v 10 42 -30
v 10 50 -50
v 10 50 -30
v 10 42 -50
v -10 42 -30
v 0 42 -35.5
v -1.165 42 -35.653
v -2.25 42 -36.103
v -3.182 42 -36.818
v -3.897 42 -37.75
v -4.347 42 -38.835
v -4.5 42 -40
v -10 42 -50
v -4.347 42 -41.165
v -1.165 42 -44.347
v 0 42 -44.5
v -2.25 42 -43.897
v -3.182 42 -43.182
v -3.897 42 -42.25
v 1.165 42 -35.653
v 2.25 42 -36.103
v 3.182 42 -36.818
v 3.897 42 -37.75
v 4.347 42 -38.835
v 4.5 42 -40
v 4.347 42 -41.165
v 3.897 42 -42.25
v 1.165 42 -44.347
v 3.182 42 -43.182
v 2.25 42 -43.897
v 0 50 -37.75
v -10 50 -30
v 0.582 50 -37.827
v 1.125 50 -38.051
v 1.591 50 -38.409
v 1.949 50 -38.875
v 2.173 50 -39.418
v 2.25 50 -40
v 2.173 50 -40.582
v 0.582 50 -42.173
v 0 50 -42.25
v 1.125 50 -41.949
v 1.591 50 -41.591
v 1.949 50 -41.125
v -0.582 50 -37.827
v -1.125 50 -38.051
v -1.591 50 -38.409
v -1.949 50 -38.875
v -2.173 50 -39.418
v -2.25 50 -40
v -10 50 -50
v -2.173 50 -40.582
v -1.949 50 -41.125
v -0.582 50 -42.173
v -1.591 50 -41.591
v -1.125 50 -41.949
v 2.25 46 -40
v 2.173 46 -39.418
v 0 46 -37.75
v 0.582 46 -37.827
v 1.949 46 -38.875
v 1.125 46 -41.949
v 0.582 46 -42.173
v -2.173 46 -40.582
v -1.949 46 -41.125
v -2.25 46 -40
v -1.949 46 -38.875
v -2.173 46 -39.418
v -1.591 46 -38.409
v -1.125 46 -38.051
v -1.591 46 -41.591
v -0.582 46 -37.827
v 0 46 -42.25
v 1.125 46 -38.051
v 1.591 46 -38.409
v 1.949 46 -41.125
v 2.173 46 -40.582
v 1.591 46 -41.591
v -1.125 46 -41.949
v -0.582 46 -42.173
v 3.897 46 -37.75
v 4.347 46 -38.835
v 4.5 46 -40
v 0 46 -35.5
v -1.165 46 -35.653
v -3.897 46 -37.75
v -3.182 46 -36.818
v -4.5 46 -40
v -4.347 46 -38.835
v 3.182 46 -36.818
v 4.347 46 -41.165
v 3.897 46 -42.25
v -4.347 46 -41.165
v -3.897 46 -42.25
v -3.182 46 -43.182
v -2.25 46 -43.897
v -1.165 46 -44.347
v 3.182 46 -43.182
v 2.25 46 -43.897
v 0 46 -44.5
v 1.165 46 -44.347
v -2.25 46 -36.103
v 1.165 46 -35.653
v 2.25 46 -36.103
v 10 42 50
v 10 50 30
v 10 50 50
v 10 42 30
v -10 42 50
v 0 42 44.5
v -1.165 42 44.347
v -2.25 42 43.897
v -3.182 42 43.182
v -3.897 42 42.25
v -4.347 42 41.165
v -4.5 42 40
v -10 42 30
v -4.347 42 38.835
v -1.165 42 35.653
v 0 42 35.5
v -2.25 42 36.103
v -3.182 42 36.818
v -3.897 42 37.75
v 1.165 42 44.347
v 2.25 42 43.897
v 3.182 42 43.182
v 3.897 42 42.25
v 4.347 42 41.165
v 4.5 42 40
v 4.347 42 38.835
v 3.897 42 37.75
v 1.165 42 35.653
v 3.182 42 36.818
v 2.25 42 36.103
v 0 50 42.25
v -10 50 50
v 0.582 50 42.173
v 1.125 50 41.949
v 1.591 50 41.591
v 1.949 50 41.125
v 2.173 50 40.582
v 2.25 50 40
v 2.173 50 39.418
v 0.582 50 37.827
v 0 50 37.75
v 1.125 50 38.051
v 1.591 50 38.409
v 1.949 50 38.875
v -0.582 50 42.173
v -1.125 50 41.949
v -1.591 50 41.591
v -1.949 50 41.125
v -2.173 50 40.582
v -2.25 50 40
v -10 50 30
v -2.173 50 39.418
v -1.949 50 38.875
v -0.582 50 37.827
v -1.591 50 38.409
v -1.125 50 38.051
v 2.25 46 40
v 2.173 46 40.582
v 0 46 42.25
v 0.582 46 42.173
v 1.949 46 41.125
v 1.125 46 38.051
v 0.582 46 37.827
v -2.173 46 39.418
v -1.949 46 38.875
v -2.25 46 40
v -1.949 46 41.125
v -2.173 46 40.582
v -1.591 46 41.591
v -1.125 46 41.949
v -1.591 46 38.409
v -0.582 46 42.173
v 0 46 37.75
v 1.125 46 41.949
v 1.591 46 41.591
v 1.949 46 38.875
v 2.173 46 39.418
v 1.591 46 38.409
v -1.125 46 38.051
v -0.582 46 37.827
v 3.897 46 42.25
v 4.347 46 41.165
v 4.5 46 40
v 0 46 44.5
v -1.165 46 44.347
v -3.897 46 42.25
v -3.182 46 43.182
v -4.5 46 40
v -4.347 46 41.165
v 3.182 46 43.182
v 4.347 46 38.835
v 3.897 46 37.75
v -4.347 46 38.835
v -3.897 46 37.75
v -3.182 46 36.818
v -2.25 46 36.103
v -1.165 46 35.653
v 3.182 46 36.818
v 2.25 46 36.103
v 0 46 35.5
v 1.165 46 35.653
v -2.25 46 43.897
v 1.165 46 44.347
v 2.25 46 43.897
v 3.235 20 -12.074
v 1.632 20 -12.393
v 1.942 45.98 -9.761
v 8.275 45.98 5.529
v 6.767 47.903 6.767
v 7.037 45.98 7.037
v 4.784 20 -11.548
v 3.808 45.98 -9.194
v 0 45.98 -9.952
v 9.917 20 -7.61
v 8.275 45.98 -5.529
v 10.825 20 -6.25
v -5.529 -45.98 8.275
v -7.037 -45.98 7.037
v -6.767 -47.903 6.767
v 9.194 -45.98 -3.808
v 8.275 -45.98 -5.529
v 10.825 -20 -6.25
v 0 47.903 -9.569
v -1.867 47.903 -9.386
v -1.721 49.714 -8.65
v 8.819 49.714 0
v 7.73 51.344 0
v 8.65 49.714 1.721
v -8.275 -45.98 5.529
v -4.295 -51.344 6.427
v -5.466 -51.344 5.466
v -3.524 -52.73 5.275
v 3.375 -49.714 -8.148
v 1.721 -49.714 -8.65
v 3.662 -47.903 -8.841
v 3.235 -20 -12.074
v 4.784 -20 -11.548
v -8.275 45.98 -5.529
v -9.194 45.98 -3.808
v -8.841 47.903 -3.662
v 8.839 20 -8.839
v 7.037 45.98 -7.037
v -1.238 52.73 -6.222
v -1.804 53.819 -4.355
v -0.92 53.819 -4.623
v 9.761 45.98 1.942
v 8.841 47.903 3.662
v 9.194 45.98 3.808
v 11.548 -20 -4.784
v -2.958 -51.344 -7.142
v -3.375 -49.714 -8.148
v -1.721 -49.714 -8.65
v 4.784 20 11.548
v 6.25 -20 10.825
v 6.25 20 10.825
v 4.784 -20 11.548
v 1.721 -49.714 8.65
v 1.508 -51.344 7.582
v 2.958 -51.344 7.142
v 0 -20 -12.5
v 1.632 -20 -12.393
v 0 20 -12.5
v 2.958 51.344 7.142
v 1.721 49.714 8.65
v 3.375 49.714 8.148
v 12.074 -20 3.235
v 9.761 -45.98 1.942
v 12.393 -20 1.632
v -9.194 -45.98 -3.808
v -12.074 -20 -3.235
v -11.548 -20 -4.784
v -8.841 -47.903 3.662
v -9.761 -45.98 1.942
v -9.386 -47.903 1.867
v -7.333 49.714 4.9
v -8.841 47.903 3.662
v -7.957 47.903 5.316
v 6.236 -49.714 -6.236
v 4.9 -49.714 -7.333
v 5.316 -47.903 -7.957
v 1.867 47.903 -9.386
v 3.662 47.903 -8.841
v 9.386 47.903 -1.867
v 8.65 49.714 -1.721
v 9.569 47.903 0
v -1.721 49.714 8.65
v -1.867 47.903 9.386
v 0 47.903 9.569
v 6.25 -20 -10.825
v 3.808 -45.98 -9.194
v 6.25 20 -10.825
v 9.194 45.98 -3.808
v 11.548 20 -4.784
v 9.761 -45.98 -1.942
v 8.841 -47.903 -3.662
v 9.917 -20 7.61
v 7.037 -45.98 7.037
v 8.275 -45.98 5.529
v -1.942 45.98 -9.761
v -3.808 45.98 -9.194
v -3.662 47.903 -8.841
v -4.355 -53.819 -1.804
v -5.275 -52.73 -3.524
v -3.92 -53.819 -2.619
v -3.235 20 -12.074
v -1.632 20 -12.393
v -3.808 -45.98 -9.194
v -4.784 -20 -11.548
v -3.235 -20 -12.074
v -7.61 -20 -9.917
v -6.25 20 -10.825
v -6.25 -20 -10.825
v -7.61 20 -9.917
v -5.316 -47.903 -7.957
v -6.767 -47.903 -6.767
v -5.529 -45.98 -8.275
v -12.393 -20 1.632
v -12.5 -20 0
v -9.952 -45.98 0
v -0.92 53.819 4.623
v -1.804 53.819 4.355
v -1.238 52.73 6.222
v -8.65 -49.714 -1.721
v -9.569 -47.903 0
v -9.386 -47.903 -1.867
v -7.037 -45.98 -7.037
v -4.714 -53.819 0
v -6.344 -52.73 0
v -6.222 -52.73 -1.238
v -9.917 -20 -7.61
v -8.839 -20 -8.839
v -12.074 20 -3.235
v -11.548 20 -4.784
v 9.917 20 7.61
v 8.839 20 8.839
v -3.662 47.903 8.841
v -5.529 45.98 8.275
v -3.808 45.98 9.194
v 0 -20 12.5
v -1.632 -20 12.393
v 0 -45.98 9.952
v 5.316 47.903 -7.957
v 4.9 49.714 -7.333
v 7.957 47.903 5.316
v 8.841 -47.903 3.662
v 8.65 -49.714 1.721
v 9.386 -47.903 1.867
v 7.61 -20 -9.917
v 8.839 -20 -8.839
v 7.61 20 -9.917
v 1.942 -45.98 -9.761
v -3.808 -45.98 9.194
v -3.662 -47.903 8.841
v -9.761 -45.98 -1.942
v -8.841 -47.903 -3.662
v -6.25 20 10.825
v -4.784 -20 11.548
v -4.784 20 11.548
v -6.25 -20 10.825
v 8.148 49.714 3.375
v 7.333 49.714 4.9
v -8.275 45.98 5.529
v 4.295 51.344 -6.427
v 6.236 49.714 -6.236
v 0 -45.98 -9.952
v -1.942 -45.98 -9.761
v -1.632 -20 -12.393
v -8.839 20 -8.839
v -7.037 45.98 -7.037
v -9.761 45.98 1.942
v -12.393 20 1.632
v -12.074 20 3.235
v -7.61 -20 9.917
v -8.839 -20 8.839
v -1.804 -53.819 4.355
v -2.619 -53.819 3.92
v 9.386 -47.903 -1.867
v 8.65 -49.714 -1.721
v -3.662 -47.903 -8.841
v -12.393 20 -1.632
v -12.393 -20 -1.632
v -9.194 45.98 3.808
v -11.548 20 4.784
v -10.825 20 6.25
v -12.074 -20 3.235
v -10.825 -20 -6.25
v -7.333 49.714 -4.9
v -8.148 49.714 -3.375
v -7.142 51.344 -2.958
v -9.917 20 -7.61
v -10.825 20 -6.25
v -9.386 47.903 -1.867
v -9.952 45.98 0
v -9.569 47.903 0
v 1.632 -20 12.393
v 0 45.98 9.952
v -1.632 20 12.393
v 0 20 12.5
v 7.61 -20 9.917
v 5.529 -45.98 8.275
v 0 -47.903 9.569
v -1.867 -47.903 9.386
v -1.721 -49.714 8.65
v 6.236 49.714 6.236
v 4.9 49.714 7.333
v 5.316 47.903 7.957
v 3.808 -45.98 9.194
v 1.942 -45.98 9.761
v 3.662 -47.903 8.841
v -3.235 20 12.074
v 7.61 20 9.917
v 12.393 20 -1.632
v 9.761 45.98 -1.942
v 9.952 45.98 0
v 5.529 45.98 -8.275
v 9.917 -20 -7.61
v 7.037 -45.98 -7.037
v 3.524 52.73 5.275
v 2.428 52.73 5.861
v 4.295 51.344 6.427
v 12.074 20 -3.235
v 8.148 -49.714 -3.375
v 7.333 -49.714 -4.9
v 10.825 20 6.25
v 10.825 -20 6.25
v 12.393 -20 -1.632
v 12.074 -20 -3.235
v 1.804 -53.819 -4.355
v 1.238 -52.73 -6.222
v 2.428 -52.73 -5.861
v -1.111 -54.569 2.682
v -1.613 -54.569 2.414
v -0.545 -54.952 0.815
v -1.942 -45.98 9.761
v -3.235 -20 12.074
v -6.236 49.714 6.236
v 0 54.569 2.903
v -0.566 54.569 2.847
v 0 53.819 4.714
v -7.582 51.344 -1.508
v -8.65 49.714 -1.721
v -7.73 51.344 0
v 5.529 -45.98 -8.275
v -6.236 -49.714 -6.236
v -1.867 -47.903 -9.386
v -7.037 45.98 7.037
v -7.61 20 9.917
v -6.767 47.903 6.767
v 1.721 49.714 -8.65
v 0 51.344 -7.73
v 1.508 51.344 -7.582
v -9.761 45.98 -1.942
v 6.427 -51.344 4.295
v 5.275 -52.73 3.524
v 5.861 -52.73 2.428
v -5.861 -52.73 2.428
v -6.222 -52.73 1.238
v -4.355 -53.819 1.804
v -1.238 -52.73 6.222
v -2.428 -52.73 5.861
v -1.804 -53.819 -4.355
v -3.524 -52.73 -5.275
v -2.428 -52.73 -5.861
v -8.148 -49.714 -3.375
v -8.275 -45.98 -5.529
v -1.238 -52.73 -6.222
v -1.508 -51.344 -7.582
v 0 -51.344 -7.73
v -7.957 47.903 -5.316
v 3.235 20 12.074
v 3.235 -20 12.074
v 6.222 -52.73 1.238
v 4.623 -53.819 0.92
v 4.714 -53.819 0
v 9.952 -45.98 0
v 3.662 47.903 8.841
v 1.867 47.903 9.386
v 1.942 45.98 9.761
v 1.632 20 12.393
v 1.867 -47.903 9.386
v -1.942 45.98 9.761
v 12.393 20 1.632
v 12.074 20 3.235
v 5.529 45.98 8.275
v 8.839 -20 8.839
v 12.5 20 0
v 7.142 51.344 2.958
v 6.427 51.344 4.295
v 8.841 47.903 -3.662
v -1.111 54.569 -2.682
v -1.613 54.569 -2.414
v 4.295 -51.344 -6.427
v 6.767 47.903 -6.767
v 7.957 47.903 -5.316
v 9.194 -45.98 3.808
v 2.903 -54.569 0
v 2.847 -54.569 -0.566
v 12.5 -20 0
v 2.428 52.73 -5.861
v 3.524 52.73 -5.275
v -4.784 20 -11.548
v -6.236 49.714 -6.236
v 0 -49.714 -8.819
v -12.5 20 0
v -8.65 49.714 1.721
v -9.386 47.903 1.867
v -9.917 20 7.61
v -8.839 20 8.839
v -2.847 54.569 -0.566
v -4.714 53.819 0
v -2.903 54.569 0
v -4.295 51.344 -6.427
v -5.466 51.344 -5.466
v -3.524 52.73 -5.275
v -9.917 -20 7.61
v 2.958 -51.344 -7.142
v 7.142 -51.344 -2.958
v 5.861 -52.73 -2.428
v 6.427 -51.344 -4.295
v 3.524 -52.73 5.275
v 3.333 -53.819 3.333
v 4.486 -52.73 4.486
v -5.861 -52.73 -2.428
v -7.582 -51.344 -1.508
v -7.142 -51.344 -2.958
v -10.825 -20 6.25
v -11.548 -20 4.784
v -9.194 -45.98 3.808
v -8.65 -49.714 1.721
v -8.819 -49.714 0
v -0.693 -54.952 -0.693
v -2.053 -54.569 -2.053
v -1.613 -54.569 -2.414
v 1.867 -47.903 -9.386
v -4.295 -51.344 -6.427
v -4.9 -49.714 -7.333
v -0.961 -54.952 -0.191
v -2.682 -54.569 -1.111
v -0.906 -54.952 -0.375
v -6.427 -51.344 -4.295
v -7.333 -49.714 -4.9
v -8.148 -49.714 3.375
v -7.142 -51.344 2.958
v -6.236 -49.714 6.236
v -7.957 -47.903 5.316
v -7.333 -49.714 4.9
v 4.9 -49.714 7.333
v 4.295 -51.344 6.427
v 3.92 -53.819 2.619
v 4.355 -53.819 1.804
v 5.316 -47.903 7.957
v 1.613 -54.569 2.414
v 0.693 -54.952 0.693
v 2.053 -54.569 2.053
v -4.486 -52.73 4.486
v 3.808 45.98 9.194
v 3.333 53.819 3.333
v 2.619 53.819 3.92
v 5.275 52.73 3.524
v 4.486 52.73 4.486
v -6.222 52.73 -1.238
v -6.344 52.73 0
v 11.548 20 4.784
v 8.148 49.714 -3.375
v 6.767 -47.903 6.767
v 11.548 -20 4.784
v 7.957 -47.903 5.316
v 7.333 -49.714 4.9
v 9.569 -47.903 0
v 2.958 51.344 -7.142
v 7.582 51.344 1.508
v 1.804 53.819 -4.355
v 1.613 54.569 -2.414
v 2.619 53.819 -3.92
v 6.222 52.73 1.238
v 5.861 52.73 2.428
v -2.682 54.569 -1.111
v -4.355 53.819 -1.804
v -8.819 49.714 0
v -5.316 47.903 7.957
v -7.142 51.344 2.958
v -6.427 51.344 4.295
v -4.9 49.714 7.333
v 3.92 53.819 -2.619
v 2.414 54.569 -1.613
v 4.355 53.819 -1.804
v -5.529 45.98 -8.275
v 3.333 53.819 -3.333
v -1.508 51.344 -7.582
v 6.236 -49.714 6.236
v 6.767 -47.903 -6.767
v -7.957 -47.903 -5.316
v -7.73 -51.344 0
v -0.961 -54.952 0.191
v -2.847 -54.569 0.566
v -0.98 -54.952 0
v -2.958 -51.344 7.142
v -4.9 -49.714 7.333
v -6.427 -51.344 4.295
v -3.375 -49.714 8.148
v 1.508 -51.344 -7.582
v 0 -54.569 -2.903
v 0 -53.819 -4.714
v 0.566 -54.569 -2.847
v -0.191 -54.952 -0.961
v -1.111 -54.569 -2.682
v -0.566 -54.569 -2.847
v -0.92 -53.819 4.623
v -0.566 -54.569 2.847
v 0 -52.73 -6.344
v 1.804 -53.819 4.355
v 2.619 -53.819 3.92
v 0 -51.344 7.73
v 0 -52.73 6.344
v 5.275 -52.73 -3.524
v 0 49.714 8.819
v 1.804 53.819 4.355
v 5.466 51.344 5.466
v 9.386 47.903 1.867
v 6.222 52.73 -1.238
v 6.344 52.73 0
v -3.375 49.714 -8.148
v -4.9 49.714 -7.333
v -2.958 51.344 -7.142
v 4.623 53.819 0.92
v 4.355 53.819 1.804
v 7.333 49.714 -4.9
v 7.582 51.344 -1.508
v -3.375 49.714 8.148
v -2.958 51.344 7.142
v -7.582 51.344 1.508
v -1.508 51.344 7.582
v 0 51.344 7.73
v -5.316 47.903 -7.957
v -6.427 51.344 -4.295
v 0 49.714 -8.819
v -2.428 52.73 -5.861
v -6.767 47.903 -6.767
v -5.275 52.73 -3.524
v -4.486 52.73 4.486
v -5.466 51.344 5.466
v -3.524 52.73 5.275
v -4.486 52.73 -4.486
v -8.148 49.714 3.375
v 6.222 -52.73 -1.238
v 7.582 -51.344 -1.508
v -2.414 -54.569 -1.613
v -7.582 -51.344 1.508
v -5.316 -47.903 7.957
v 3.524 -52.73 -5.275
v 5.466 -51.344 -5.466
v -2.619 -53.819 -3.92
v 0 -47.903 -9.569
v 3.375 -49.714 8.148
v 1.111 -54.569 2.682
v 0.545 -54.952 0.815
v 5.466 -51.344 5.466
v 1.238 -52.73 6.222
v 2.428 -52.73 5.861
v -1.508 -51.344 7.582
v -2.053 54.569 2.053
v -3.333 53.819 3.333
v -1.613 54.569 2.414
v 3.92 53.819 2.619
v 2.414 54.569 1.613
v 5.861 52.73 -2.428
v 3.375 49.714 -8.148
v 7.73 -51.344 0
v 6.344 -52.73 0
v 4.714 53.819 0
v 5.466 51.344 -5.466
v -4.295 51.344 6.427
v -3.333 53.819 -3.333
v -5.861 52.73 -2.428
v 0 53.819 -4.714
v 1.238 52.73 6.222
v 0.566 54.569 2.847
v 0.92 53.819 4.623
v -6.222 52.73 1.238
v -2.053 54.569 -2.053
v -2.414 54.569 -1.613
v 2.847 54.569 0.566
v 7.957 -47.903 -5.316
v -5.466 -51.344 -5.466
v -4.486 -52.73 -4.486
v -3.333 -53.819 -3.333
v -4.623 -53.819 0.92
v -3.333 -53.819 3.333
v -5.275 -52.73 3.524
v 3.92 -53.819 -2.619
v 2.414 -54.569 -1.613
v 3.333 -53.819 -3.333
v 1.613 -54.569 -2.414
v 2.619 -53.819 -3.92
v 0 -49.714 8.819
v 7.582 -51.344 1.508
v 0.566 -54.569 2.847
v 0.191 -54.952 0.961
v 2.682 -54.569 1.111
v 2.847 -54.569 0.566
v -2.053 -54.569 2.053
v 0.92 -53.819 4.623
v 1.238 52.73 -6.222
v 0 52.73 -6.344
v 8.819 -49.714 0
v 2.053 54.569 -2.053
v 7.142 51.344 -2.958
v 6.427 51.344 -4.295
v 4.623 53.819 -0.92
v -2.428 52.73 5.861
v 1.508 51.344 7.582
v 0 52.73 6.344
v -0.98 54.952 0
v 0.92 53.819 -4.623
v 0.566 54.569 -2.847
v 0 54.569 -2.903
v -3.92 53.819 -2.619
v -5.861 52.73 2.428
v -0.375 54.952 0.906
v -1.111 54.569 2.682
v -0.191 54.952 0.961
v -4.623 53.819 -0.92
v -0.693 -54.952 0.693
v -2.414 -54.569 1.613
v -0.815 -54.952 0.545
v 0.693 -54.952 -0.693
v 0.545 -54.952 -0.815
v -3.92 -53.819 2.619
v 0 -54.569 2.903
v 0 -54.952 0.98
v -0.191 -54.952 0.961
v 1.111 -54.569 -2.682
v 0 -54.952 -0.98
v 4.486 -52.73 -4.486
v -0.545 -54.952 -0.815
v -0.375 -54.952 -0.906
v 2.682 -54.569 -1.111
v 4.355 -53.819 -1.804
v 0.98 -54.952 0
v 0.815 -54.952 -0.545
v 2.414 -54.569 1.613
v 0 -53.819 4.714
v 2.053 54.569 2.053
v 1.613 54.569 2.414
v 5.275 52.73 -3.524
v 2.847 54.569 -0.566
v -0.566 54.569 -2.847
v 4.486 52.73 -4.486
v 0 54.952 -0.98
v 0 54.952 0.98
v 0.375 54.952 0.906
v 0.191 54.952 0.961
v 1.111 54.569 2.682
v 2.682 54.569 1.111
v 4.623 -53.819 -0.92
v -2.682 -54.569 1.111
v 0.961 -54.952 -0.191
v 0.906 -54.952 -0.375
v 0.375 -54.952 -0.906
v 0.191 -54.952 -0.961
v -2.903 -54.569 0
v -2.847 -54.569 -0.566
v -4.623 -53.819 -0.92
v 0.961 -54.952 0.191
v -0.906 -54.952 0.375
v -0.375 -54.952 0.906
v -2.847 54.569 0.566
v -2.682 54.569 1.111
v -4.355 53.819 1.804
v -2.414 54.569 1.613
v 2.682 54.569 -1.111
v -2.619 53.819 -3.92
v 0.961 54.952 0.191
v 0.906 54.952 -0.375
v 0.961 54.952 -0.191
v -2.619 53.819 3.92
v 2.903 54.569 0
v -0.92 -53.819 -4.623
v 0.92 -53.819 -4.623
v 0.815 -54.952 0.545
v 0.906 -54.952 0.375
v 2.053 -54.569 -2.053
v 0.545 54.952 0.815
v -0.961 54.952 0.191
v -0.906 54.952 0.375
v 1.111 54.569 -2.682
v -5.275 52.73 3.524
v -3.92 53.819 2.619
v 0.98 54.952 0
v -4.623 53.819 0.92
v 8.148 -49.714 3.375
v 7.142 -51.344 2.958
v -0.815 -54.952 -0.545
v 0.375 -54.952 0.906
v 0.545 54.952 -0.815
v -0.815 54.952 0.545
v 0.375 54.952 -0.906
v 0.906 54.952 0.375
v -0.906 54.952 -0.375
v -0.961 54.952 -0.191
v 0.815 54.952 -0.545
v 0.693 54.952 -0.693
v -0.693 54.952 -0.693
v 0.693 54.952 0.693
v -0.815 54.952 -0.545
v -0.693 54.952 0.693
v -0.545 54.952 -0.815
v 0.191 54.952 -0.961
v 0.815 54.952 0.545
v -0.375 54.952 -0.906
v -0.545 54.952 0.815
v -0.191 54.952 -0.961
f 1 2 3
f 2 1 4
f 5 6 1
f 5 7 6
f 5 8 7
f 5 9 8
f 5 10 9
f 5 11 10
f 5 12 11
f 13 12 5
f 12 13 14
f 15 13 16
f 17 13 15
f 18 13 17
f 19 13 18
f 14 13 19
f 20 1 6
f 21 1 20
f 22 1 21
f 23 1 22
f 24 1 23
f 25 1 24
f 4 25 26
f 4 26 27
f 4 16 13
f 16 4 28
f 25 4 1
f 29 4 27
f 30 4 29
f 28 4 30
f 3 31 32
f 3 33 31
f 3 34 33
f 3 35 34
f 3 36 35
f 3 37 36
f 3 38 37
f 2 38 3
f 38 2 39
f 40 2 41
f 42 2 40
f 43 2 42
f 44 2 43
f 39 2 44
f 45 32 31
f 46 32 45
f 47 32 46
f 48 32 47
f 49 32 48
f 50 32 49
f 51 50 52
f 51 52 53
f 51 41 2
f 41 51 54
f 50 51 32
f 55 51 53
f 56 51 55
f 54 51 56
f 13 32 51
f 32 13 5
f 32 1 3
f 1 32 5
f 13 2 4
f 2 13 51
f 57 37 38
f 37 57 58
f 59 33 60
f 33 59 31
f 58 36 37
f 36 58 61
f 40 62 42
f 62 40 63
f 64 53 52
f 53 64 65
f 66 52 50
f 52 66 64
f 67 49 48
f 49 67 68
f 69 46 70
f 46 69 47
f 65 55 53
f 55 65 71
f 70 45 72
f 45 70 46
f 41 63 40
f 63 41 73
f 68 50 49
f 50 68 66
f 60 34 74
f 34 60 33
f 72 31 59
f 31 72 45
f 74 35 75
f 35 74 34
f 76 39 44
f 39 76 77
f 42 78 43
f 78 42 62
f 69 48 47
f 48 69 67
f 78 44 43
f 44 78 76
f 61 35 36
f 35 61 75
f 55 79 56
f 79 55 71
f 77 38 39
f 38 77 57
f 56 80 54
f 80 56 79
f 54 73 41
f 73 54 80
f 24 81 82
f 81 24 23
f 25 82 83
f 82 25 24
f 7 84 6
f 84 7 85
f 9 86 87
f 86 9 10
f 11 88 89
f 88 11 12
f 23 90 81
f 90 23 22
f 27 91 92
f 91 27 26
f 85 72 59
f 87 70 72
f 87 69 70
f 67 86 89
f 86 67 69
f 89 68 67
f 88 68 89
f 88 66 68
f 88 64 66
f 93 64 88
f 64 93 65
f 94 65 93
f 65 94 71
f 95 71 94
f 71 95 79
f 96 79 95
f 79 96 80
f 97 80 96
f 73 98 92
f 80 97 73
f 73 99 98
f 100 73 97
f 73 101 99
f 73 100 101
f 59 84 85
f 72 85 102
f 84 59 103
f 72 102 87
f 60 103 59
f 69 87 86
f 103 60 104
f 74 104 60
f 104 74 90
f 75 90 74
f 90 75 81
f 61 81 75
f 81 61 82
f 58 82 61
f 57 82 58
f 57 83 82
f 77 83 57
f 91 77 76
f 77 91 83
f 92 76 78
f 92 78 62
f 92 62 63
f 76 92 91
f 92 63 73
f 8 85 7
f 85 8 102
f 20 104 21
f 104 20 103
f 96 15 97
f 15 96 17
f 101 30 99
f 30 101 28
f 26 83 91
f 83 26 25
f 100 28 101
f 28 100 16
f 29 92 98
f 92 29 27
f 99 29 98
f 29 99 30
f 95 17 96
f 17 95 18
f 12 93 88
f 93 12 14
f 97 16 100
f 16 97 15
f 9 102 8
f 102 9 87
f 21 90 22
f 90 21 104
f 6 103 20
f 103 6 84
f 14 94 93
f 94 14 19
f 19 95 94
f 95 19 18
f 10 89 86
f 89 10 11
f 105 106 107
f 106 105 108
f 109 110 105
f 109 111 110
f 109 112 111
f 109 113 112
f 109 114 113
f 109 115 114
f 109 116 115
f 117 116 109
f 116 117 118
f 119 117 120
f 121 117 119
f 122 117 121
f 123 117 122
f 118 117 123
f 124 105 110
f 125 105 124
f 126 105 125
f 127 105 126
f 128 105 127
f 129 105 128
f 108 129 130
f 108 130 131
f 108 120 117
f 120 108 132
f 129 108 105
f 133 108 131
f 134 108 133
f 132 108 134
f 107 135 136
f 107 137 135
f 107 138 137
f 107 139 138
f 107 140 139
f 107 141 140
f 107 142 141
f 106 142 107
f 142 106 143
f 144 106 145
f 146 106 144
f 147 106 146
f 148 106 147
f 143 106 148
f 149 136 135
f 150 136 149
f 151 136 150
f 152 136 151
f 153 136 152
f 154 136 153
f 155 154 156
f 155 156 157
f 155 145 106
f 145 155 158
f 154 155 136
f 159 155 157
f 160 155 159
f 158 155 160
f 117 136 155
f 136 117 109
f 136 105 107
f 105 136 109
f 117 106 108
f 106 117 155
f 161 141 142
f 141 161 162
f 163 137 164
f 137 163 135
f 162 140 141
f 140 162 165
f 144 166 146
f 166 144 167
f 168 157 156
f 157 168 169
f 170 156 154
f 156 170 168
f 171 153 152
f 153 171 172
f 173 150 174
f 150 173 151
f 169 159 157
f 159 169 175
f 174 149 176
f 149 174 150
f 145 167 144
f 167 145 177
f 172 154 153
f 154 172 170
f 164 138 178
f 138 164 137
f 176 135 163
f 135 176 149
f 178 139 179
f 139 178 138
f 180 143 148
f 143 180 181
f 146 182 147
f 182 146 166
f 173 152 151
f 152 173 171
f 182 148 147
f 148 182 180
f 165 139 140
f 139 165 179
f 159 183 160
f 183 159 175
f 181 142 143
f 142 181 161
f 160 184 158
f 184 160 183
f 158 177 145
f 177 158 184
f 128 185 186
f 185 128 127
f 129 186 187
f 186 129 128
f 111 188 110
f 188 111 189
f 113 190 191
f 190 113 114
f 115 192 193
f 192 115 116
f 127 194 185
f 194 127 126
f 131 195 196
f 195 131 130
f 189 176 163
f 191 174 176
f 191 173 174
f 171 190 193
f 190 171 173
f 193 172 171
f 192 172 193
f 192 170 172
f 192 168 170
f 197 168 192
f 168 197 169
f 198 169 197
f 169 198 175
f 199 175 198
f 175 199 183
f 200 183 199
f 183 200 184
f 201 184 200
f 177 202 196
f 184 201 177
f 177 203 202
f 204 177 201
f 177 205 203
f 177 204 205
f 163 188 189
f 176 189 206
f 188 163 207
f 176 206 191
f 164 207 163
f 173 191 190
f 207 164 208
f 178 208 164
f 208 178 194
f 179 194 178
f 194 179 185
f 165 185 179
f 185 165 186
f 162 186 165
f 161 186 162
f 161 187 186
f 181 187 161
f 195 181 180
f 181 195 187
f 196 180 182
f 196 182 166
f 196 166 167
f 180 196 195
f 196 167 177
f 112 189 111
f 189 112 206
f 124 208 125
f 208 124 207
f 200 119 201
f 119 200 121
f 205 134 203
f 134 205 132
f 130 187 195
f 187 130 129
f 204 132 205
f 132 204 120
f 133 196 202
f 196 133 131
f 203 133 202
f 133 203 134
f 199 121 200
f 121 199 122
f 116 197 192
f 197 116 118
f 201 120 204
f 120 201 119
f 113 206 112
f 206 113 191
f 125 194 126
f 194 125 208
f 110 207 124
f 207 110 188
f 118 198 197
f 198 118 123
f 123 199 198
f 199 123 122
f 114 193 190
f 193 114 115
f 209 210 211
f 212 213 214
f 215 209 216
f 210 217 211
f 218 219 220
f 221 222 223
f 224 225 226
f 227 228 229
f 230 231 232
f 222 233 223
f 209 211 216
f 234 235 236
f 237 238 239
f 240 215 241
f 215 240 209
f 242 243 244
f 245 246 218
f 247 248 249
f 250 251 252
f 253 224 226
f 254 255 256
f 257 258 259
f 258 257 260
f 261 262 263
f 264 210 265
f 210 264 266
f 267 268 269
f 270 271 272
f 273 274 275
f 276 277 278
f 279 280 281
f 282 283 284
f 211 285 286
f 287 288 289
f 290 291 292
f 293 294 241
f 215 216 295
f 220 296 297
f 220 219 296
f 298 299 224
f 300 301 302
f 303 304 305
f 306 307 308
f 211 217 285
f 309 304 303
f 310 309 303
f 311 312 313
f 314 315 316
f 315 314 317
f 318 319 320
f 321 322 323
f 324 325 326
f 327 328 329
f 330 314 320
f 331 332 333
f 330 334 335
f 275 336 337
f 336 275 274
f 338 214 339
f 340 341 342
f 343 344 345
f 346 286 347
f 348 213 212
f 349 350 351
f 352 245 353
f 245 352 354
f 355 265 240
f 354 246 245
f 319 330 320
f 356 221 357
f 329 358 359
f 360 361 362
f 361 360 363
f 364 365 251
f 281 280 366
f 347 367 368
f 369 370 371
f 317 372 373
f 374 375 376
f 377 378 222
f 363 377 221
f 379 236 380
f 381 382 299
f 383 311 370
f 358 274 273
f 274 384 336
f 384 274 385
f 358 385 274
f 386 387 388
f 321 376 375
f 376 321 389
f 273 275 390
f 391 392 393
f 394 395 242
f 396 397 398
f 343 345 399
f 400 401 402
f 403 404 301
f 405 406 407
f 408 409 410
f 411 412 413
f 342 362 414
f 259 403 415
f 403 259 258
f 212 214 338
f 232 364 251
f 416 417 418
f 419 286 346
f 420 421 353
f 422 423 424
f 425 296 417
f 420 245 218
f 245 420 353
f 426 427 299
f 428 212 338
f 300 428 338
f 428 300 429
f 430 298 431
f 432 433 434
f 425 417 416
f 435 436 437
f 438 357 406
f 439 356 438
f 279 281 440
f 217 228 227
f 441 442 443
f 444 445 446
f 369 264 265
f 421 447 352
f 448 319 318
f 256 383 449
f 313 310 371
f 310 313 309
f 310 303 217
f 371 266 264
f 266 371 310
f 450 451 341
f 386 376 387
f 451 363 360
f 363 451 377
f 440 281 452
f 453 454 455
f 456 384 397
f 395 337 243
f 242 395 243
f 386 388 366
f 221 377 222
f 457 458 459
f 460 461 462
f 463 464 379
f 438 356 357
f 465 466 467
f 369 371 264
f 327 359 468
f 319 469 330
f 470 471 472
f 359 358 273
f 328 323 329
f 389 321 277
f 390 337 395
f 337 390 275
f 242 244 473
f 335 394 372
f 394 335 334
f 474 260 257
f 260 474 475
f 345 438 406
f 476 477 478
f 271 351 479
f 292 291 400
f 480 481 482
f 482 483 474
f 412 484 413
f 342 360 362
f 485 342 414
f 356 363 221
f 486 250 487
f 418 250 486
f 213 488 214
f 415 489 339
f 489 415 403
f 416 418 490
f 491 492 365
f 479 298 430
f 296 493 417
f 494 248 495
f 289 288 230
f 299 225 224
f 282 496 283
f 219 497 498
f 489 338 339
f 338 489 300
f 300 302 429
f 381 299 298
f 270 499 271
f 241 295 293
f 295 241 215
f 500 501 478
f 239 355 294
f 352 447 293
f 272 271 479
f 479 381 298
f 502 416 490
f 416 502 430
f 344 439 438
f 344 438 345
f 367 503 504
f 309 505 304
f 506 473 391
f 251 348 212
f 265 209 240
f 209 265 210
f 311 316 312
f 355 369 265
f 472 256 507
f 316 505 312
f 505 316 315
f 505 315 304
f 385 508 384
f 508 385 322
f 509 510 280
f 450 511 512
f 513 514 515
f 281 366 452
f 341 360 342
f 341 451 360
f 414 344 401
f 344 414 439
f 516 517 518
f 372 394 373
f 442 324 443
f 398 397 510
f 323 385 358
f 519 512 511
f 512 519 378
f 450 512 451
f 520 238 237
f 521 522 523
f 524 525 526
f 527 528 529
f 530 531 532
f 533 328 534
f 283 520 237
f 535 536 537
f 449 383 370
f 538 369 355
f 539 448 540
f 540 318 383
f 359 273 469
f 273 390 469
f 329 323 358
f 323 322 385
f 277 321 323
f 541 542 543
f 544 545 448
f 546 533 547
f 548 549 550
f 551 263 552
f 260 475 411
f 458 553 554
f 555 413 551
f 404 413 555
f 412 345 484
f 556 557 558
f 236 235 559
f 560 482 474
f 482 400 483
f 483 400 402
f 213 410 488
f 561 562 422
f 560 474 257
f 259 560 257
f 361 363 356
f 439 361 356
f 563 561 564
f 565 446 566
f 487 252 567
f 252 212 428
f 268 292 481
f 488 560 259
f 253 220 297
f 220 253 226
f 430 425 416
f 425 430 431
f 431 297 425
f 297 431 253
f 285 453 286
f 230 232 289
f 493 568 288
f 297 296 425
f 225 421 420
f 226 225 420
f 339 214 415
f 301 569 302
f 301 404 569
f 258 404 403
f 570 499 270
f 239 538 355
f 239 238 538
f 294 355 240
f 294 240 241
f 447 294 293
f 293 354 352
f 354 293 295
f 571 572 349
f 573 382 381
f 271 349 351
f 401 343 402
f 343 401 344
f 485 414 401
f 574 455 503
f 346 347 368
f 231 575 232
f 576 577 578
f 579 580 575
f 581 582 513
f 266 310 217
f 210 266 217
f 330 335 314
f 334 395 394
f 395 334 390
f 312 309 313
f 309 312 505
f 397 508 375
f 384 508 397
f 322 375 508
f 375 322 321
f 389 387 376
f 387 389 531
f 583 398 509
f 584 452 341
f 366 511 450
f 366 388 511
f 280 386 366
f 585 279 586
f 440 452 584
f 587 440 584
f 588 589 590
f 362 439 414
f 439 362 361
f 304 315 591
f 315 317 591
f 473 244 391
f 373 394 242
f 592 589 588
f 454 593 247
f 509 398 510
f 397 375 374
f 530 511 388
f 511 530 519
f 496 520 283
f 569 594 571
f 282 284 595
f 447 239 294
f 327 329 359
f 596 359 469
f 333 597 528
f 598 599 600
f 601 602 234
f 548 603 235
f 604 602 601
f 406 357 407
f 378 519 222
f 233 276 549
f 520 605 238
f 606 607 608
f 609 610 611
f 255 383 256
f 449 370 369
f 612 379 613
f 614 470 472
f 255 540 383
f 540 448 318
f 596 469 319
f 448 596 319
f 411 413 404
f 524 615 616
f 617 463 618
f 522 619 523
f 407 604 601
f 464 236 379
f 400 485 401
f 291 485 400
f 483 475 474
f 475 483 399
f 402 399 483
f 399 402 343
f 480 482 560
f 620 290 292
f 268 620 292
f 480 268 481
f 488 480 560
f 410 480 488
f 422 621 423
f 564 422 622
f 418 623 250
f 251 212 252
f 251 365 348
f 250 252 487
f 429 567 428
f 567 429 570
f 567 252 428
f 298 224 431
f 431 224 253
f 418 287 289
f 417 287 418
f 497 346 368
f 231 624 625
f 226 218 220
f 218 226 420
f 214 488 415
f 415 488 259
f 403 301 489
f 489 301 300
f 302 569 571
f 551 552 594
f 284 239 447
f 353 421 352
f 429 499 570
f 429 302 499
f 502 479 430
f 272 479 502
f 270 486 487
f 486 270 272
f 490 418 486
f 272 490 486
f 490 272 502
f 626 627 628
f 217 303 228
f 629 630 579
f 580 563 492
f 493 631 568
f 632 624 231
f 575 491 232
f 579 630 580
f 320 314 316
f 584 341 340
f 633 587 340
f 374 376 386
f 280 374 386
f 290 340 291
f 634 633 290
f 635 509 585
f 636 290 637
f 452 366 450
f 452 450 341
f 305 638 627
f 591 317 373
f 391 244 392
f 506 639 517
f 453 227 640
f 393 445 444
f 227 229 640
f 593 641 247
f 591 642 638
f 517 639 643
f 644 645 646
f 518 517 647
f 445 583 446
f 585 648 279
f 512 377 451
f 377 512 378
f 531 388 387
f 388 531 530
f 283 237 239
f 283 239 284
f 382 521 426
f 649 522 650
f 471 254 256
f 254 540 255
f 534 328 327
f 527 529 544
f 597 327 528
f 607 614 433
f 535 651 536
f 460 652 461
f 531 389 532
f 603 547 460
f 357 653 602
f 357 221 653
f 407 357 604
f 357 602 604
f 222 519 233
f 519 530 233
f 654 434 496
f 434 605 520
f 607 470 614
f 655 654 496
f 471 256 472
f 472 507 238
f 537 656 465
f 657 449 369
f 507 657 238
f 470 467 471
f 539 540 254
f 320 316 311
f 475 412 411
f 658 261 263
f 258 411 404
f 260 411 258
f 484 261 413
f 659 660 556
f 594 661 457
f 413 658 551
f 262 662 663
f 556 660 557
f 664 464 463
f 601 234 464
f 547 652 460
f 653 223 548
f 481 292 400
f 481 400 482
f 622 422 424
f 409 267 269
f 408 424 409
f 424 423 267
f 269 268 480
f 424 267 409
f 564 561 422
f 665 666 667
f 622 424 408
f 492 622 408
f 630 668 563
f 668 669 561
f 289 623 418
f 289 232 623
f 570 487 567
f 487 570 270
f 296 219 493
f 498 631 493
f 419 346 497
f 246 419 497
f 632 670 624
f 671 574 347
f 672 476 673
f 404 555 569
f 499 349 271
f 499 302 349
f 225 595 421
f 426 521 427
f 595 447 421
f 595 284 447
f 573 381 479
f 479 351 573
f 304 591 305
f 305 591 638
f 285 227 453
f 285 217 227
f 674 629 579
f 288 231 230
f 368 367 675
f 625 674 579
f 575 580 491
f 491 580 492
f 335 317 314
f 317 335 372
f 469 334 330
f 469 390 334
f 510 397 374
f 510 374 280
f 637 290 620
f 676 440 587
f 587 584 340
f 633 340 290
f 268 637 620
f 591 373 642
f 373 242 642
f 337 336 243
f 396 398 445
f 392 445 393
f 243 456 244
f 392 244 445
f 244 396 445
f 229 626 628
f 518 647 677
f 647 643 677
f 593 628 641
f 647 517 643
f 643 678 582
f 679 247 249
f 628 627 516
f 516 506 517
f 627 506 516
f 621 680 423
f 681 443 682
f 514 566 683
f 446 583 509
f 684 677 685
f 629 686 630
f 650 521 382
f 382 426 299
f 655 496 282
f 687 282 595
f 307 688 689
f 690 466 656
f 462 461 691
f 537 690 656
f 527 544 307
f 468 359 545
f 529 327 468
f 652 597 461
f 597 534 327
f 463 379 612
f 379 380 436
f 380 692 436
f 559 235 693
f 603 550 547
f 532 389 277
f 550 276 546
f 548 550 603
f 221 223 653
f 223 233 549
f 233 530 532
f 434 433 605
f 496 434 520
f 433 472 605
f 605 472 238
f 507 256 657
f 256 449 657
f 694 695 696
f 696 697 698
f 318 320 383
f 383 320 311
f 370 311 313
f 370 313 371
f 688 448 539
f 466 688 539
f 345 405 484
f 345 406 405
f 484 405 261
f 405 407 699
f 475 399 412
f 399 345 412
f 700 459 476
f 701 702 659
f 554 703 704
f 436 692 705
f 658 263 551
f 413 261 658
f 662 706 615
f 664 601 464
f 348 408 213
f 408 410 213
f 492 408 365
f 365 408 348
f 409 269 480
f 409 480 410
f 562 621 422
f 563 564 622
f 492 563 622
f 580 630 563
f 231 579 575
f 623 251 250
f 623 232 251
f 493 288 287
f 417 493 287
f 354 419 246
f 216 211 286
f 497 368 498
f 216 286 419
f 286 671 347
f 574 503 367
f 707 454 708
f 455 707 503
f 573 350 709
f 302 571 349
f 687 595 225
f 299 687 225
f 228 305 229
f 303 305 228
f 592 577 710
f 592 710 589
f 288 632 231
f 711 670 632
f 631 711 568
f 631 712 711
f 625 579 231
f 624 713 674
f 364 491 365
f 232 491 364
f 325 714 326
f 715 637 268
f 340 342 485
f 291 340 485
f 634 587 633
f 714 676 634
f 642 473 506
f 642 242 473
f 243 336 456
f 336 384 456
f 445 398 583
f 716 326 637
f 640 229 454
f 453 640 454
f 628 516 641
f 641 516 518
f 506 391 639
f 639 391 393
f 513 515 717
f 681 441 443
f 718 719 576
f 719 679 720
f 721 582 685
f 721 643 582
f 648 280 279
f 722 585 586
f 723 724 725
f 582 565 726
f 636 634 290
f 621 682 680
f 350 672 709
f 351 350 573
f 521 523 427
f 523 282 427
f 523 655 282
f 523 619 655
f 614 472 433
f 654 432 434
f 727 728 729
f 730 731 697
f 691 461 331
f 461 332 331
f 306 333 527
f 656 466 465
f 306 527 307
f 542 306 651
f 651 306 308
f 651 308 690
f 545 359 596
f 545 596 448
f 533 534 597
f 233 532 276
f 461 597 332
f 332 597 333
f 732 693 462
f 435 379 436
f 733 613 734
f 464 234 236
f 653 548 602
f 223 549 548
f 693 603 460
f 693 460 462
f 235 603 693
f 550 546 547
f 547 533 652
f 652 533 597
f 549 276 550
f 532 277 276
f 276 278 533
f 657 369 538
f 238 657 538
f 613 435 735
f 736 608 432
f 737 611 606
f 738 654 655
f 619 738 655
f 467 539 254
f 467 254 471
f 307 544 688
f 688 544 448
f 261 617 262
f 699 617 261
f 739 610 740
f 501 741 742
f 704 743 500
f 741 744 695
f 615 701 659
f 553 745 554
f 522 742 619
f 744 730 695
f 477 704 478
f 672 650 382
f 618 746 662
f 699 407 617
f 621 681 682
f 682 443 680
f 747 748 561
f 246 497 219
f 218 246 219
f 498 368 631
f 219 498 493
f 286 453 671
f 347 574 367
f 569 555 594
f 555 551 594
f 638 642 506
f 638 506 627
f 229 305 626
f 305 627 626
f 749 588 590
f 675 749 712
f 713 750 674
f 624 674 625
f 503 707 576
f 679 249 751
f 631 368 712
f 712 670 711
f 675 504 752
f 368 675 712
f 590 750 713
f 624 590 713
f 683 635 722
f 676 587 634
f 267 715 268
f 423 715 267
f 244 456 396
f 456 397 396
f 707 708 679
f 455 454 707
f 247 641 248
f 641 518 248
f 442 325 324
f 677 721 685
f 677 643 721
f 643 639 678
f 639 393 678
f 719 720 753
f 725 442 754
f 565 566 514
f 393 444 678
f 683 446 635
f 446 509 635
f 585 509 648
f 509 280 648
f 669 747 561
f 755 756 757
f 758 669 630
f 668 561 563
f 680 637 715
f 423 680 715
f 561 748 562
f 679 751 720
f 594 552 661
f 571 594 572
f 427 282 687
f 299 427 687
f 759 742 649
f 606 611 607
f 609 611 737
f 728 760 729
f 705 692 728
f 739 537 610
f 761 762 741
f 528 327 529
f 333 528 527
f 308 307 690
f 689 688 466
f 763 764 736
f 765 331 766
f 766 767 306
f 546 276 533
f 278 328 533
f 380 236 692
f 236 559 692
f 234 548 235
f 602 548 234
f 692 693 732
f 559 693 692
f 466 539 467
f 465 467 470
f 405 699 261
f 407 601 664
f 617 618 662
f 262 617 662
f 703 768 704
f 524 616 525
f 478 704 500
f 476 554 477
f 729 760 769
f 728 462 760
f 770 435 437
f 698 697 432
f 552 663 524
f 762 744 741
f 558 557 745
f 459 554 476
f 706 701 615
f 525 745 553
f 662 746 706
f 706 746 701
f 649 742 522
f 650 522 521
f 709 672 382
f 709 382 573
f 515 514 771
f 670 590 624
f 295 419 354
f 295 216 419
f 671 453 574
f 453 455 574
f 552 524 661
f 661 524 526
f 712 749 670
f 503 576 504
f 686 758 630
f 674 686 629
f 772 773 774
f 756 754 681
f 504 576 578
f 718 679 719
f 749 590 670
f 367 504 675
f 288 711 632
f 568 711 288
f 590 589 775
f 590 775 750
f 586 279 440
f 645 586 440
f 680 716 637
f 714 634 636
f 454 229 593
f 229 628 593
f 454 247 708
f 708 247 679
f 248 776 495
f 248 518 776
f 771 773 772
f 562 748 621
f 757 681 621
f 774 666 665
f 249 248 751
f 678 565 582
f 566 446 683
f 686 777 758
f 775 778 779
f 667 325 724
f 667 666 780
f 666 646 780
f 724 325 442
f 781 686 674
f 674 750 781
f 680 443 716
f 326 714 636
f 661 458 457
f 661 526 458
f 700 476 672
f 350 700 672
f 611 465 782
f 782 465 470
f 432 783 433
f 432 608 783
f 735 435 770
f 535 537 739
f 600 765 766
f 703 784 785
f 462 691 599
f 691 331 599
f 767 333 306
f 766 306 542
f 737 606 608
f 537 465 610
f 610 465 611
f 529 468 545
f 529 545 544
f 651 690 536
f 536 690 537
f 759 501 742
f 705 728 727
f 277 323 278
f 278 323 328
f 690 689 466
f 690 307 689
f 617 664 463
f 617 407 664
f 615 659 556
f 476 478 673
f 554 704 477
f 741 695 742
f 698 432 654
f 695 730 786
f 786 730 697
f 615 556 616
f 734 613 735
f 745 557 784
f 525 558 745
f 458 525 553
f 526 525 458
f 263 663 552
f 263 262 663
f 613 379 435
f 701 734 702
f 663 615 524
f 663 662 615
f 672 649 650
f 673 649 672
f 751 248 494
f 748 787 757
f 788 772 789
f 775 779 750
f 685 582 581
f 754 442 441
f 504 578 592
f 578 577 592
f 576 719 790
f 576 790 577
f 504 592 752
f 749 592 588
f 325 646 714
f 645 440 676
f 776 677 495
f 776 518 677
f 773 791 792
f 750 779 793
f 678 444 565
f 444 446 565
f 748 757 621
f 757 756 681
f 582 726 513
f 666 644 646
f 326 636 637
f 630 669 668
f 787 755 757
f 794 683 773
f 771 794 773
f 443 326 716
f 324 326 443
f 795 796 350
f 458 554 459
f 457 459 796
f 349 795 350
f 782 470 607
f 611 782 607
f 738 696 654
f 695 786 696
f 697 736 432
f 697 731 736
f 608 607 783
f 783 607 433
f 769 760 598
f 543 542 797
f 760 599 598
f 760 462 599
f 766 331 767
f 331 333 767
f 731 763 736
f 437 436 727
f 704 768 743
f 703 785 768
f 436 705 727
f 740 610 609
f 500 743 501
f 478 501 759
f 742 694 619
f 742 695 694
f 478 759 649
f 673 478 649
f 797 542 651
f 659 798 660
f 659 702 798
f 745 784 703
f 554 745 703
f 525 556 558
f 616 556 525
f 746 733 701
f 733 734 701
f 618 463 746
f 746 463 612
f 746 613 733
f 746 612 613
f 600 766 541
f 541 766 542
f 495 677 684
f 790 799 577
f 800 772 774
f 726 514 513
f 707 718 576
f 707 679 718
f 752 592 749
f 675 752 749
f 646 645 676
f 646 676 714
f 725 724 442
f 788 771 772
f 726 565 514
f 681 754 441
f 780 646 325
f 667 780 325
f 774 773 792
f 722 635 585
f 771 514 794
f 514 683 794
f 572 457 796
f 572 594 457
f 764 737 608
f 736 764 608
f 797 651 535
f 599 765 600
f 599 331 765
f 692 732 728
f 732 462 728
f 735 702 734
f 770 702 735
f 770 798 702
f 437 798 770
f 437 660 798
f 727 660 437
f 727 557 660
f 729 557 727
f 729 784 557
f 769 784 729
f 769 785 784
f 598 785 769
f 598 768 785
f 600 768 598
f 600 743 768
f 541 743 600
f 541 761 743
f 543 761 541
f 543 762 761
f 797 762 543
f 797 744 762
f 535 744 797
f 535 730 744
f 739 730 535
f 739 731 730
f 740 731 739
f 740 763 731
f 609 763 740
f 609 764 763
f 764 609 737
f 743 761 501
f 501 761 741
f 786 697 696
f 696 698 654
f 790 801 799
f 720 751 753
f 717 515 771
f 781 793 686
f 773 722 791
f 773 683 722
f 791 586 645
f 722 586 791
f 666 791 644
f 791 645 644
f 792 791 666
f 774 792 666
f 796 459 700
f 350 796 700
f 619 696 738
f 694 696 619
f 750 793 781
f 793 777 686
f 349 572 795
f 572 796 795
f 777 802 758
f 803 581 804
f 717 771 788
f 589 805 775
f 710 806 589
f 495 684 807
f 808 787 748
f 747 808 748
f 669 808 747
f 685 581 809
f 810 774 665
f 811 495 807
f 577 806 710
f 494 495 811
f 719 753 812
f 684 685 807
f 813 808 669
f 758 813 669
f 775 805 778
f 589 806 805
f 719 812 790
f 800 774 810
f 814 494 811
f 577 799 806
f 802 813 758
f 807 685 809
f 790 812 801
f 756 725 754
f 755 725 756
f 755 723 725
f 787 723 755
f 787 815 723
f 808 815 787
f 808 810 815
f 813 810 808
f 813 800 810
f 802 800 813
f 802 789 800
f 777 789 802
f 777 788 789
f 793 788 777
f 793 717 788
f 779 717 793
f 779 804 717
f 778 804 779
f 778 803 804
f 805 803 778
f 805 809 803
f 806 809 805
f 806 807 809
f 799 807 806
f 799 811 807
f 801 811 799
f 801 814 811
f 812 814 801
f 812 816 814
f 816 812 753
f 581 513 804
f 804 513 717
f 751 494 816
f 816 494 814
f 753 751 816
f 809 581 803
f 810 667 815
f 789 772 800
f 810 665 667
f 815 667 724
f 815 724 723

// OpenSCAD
// ============================================================
// Parametric Handle — Replacement / Custom
// ============================================================
// Printable replacement handle for tools, drawers, doors.
// Screw-mount style, adjustable ergonomic profile.

// ---- PARAMETERS ----
handle_l    = 100;   // Handle length (mm)
handle_dia  = 25;    // Grip diameter at thickest point (ergonomic: 22–30mm)
grip_taper  = 0.8;   // Taper ratio at ends (1.0 = cylinder, 0.7 = teardrop grip)
mount_w     = 80;    // Distance between mounting holes (mm)
screw_d     = 4.5;   // M4 screw clearance = 4.5mm
head_counter = 4;    // Countersink depth for flush screw head
fillet      = 5;     // End rounding radius

// ---- GRIP BODY ----
// Hull between end circles creates the tapered grip shape
module grip_body() {
    end_r = (handle_dia / 2) * grip_taper;
    mid_r = handle_dia / 2;
    hull() {
        // End caps
        translate([0, 0, fillet]) sphere(r=end_r, $fn=32);
        translate([0, 0, handle_l - fillet]) sphere(r=end_r, $fn=32);
        // Middle body
        translate([0, 0, handle_l * 0.3]) cylinder(r=mid_r, h=handle_l*0.4, $fn=48);
    }
}

// ---- MOUNTING POSTS ----
// Flat mounting pads with screw holes under the handle
module mount_posts() {
    pad_h = 8;
    pad_w = 20;
    for (y = [-mount_w/2, mount_w/2]) {
        translate([-pad_w/2, y - pad_w/2, 0])
        difference() {
            cube([pad_w, pad_w, pad_h]);
            // Countersunk screw hole
            translate([pad_w/2, pad_w/2, -0.1])
                cylinder(d=screw_d, h=pad_h + 0.2, $fn=24);
            translate([pad_w/2, pad_w/2, pad_h - head_counter])
                cylinder(d=screw_d * 2, h=head_counter + 0.1, $fn=24);
        }
    }
}

// ---- ROTATE HANDLE HORIZONTAL ----
rotate([90, 0, 0])
translate([0, 0, -handle_l/2]) {
    grip_body();
    translate([0, 0, 0]) mount_posts();
}
